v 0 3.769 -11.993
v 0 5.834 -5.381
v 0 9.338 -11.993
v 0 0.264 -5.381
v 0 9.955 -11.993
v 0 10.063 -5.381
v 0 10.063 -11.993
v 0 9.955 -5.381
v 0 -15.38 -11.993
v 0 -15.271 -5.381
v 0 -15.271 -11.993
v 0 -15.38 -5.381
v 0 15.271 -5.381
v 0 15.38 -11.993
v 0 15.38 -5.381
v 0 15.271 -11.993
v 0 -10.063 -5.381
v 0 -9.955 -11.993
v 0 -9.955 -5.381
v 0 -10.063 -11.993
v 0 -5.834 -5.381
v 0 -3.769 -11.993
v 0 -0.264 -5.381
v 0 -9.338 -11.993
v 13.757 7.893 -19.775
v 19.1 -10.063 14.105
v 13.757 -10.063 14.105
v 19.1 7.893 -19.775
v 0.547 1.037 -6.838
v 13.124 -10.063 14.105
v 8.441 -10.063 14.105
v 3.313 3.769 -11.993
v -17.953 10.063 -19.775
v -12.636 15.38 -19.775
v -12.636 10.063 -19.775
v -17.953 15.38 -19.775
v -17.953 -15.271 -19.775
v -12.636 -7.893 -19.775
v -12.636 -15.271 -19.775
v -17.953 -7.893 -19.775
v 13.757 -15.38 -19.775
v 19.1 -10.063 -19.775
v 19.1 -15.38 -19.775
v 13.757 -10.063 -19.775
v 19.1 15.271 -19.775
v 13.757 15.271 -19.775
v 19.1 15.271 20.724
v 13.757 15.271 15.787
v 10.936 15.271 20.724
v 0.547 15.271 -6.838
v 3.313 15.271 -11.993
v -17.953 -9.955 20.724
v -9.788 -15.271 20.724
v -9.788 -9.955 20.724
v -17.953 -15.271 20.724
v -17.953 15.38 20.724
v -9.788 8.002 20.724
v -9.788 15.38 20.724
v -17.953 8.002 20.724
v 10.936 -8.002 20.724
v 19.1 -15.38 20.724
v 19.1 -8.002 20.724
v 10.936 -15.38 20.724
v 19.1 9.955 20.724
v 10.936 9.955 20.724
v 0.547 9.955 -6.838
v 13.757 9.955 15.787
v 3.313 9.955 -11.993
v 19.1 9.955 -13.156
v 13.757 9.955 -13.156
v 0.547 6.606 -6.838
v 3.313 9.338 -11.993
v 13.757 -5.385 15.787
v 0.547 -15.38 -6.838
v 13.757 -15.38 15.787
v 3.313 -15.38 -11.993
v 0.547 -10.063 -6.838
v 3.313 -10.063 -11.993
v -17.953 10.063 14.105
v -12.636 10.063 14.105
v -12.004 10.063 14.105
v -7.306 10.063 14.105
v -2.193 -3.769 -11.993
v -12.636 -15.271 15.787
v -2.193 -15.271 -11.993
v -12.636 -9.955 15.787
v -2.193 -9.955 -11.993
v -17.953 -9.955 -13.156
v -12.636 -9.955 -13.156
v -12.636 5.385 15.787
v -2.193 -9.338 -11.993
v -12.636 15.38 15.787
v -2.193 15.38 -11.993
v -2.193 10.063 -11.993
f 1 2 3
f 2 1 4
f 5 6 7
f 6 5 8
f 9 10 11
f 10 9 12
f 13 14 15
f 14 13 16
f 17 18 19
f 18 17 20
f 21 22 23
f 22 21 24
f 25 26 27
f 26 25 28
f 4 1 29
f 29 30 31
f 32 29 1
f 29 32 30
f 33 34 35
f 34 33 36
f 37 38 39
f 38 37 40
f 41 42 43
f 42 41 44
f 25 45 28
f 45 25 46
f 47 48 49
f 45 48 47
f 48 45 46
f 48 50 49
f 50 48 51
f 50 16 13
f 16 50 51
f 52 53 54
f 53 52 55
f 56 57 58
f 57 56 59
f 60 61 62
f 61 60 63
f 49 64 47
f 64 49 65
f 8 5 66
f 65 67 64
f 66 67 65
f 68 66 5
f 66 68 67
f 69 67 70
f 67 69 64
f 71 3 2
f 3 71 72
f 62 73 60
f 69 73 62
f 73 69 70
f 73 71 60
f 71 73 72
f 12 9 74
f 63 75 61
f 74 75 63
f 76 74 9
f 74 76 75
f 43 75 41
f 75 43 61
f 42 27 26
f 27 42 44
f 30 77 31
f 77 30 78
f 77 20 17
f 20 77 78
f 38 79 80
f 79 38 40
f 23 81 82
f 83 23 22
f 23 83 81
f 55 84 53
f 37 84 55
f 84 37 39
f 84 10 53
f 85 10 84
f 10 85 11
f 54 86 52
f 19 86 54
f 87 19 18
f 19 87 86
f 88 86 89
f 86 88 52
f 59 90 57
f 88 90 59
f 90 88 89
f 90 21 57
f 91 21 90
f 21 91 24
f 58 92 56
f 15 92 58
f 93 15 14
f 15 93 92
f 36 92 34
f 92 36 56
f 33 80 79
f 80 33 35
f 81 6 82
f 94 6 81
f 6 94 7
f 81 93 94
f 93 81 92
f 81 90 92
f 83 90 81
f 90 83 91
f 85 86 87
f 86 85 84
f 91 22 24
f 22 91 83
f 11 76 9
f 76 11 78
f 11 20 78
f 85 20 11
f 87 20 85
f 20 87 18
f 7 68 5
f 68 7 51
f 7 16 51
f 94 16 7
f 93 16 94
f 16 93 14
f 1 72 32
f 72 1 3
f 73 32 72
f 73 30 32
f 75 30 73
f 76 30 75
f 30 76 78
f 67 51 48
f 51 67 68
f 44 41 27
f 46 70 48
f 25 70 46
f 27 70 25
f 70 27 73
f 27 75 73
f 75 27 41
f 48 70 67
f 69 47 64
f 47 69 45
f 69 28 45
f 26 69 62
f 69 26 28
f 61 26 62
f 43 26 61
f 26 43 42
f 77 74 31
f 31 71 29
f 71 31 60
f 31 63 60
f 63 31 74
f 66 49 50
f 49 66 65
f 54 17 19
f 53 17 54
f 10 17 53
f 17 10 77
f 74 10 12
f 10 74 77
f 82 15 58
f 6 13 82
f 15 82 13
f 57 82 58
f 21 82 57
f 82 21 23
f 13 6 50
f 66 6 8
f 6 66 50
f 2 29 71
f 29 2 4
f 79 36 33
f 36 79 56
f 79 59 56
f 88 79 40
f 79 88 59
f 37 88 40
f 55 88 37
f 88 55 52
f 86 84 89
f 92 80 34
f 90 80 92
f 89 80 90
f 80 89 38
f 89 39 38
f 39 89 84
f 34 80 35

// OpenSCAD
intersection() {
    //rotate([0,0,0]) translate([-3,0,0]) linear_extrude(100, center=true) text("M", size=40, halign="center", valign="center", font="open sans extrabold");
    rotate([90,0,0]) linear_extrude(100, center=true) text("M", size=40, halign="center", valign="center", font="open sans extrabold");
    union() {
    rotate([90,0,90]) translate([-0.54,0,0]) linear_extrude(100) text("N", size=40, halign="center", valign="center", font="open sans extrabold");
    rotate([90,0,-90]) translate([-0.54,0,0]) linear_extrude(100) text("N", size=40, halign="center", valign="center", font="open sans extrabold");
    }
}
